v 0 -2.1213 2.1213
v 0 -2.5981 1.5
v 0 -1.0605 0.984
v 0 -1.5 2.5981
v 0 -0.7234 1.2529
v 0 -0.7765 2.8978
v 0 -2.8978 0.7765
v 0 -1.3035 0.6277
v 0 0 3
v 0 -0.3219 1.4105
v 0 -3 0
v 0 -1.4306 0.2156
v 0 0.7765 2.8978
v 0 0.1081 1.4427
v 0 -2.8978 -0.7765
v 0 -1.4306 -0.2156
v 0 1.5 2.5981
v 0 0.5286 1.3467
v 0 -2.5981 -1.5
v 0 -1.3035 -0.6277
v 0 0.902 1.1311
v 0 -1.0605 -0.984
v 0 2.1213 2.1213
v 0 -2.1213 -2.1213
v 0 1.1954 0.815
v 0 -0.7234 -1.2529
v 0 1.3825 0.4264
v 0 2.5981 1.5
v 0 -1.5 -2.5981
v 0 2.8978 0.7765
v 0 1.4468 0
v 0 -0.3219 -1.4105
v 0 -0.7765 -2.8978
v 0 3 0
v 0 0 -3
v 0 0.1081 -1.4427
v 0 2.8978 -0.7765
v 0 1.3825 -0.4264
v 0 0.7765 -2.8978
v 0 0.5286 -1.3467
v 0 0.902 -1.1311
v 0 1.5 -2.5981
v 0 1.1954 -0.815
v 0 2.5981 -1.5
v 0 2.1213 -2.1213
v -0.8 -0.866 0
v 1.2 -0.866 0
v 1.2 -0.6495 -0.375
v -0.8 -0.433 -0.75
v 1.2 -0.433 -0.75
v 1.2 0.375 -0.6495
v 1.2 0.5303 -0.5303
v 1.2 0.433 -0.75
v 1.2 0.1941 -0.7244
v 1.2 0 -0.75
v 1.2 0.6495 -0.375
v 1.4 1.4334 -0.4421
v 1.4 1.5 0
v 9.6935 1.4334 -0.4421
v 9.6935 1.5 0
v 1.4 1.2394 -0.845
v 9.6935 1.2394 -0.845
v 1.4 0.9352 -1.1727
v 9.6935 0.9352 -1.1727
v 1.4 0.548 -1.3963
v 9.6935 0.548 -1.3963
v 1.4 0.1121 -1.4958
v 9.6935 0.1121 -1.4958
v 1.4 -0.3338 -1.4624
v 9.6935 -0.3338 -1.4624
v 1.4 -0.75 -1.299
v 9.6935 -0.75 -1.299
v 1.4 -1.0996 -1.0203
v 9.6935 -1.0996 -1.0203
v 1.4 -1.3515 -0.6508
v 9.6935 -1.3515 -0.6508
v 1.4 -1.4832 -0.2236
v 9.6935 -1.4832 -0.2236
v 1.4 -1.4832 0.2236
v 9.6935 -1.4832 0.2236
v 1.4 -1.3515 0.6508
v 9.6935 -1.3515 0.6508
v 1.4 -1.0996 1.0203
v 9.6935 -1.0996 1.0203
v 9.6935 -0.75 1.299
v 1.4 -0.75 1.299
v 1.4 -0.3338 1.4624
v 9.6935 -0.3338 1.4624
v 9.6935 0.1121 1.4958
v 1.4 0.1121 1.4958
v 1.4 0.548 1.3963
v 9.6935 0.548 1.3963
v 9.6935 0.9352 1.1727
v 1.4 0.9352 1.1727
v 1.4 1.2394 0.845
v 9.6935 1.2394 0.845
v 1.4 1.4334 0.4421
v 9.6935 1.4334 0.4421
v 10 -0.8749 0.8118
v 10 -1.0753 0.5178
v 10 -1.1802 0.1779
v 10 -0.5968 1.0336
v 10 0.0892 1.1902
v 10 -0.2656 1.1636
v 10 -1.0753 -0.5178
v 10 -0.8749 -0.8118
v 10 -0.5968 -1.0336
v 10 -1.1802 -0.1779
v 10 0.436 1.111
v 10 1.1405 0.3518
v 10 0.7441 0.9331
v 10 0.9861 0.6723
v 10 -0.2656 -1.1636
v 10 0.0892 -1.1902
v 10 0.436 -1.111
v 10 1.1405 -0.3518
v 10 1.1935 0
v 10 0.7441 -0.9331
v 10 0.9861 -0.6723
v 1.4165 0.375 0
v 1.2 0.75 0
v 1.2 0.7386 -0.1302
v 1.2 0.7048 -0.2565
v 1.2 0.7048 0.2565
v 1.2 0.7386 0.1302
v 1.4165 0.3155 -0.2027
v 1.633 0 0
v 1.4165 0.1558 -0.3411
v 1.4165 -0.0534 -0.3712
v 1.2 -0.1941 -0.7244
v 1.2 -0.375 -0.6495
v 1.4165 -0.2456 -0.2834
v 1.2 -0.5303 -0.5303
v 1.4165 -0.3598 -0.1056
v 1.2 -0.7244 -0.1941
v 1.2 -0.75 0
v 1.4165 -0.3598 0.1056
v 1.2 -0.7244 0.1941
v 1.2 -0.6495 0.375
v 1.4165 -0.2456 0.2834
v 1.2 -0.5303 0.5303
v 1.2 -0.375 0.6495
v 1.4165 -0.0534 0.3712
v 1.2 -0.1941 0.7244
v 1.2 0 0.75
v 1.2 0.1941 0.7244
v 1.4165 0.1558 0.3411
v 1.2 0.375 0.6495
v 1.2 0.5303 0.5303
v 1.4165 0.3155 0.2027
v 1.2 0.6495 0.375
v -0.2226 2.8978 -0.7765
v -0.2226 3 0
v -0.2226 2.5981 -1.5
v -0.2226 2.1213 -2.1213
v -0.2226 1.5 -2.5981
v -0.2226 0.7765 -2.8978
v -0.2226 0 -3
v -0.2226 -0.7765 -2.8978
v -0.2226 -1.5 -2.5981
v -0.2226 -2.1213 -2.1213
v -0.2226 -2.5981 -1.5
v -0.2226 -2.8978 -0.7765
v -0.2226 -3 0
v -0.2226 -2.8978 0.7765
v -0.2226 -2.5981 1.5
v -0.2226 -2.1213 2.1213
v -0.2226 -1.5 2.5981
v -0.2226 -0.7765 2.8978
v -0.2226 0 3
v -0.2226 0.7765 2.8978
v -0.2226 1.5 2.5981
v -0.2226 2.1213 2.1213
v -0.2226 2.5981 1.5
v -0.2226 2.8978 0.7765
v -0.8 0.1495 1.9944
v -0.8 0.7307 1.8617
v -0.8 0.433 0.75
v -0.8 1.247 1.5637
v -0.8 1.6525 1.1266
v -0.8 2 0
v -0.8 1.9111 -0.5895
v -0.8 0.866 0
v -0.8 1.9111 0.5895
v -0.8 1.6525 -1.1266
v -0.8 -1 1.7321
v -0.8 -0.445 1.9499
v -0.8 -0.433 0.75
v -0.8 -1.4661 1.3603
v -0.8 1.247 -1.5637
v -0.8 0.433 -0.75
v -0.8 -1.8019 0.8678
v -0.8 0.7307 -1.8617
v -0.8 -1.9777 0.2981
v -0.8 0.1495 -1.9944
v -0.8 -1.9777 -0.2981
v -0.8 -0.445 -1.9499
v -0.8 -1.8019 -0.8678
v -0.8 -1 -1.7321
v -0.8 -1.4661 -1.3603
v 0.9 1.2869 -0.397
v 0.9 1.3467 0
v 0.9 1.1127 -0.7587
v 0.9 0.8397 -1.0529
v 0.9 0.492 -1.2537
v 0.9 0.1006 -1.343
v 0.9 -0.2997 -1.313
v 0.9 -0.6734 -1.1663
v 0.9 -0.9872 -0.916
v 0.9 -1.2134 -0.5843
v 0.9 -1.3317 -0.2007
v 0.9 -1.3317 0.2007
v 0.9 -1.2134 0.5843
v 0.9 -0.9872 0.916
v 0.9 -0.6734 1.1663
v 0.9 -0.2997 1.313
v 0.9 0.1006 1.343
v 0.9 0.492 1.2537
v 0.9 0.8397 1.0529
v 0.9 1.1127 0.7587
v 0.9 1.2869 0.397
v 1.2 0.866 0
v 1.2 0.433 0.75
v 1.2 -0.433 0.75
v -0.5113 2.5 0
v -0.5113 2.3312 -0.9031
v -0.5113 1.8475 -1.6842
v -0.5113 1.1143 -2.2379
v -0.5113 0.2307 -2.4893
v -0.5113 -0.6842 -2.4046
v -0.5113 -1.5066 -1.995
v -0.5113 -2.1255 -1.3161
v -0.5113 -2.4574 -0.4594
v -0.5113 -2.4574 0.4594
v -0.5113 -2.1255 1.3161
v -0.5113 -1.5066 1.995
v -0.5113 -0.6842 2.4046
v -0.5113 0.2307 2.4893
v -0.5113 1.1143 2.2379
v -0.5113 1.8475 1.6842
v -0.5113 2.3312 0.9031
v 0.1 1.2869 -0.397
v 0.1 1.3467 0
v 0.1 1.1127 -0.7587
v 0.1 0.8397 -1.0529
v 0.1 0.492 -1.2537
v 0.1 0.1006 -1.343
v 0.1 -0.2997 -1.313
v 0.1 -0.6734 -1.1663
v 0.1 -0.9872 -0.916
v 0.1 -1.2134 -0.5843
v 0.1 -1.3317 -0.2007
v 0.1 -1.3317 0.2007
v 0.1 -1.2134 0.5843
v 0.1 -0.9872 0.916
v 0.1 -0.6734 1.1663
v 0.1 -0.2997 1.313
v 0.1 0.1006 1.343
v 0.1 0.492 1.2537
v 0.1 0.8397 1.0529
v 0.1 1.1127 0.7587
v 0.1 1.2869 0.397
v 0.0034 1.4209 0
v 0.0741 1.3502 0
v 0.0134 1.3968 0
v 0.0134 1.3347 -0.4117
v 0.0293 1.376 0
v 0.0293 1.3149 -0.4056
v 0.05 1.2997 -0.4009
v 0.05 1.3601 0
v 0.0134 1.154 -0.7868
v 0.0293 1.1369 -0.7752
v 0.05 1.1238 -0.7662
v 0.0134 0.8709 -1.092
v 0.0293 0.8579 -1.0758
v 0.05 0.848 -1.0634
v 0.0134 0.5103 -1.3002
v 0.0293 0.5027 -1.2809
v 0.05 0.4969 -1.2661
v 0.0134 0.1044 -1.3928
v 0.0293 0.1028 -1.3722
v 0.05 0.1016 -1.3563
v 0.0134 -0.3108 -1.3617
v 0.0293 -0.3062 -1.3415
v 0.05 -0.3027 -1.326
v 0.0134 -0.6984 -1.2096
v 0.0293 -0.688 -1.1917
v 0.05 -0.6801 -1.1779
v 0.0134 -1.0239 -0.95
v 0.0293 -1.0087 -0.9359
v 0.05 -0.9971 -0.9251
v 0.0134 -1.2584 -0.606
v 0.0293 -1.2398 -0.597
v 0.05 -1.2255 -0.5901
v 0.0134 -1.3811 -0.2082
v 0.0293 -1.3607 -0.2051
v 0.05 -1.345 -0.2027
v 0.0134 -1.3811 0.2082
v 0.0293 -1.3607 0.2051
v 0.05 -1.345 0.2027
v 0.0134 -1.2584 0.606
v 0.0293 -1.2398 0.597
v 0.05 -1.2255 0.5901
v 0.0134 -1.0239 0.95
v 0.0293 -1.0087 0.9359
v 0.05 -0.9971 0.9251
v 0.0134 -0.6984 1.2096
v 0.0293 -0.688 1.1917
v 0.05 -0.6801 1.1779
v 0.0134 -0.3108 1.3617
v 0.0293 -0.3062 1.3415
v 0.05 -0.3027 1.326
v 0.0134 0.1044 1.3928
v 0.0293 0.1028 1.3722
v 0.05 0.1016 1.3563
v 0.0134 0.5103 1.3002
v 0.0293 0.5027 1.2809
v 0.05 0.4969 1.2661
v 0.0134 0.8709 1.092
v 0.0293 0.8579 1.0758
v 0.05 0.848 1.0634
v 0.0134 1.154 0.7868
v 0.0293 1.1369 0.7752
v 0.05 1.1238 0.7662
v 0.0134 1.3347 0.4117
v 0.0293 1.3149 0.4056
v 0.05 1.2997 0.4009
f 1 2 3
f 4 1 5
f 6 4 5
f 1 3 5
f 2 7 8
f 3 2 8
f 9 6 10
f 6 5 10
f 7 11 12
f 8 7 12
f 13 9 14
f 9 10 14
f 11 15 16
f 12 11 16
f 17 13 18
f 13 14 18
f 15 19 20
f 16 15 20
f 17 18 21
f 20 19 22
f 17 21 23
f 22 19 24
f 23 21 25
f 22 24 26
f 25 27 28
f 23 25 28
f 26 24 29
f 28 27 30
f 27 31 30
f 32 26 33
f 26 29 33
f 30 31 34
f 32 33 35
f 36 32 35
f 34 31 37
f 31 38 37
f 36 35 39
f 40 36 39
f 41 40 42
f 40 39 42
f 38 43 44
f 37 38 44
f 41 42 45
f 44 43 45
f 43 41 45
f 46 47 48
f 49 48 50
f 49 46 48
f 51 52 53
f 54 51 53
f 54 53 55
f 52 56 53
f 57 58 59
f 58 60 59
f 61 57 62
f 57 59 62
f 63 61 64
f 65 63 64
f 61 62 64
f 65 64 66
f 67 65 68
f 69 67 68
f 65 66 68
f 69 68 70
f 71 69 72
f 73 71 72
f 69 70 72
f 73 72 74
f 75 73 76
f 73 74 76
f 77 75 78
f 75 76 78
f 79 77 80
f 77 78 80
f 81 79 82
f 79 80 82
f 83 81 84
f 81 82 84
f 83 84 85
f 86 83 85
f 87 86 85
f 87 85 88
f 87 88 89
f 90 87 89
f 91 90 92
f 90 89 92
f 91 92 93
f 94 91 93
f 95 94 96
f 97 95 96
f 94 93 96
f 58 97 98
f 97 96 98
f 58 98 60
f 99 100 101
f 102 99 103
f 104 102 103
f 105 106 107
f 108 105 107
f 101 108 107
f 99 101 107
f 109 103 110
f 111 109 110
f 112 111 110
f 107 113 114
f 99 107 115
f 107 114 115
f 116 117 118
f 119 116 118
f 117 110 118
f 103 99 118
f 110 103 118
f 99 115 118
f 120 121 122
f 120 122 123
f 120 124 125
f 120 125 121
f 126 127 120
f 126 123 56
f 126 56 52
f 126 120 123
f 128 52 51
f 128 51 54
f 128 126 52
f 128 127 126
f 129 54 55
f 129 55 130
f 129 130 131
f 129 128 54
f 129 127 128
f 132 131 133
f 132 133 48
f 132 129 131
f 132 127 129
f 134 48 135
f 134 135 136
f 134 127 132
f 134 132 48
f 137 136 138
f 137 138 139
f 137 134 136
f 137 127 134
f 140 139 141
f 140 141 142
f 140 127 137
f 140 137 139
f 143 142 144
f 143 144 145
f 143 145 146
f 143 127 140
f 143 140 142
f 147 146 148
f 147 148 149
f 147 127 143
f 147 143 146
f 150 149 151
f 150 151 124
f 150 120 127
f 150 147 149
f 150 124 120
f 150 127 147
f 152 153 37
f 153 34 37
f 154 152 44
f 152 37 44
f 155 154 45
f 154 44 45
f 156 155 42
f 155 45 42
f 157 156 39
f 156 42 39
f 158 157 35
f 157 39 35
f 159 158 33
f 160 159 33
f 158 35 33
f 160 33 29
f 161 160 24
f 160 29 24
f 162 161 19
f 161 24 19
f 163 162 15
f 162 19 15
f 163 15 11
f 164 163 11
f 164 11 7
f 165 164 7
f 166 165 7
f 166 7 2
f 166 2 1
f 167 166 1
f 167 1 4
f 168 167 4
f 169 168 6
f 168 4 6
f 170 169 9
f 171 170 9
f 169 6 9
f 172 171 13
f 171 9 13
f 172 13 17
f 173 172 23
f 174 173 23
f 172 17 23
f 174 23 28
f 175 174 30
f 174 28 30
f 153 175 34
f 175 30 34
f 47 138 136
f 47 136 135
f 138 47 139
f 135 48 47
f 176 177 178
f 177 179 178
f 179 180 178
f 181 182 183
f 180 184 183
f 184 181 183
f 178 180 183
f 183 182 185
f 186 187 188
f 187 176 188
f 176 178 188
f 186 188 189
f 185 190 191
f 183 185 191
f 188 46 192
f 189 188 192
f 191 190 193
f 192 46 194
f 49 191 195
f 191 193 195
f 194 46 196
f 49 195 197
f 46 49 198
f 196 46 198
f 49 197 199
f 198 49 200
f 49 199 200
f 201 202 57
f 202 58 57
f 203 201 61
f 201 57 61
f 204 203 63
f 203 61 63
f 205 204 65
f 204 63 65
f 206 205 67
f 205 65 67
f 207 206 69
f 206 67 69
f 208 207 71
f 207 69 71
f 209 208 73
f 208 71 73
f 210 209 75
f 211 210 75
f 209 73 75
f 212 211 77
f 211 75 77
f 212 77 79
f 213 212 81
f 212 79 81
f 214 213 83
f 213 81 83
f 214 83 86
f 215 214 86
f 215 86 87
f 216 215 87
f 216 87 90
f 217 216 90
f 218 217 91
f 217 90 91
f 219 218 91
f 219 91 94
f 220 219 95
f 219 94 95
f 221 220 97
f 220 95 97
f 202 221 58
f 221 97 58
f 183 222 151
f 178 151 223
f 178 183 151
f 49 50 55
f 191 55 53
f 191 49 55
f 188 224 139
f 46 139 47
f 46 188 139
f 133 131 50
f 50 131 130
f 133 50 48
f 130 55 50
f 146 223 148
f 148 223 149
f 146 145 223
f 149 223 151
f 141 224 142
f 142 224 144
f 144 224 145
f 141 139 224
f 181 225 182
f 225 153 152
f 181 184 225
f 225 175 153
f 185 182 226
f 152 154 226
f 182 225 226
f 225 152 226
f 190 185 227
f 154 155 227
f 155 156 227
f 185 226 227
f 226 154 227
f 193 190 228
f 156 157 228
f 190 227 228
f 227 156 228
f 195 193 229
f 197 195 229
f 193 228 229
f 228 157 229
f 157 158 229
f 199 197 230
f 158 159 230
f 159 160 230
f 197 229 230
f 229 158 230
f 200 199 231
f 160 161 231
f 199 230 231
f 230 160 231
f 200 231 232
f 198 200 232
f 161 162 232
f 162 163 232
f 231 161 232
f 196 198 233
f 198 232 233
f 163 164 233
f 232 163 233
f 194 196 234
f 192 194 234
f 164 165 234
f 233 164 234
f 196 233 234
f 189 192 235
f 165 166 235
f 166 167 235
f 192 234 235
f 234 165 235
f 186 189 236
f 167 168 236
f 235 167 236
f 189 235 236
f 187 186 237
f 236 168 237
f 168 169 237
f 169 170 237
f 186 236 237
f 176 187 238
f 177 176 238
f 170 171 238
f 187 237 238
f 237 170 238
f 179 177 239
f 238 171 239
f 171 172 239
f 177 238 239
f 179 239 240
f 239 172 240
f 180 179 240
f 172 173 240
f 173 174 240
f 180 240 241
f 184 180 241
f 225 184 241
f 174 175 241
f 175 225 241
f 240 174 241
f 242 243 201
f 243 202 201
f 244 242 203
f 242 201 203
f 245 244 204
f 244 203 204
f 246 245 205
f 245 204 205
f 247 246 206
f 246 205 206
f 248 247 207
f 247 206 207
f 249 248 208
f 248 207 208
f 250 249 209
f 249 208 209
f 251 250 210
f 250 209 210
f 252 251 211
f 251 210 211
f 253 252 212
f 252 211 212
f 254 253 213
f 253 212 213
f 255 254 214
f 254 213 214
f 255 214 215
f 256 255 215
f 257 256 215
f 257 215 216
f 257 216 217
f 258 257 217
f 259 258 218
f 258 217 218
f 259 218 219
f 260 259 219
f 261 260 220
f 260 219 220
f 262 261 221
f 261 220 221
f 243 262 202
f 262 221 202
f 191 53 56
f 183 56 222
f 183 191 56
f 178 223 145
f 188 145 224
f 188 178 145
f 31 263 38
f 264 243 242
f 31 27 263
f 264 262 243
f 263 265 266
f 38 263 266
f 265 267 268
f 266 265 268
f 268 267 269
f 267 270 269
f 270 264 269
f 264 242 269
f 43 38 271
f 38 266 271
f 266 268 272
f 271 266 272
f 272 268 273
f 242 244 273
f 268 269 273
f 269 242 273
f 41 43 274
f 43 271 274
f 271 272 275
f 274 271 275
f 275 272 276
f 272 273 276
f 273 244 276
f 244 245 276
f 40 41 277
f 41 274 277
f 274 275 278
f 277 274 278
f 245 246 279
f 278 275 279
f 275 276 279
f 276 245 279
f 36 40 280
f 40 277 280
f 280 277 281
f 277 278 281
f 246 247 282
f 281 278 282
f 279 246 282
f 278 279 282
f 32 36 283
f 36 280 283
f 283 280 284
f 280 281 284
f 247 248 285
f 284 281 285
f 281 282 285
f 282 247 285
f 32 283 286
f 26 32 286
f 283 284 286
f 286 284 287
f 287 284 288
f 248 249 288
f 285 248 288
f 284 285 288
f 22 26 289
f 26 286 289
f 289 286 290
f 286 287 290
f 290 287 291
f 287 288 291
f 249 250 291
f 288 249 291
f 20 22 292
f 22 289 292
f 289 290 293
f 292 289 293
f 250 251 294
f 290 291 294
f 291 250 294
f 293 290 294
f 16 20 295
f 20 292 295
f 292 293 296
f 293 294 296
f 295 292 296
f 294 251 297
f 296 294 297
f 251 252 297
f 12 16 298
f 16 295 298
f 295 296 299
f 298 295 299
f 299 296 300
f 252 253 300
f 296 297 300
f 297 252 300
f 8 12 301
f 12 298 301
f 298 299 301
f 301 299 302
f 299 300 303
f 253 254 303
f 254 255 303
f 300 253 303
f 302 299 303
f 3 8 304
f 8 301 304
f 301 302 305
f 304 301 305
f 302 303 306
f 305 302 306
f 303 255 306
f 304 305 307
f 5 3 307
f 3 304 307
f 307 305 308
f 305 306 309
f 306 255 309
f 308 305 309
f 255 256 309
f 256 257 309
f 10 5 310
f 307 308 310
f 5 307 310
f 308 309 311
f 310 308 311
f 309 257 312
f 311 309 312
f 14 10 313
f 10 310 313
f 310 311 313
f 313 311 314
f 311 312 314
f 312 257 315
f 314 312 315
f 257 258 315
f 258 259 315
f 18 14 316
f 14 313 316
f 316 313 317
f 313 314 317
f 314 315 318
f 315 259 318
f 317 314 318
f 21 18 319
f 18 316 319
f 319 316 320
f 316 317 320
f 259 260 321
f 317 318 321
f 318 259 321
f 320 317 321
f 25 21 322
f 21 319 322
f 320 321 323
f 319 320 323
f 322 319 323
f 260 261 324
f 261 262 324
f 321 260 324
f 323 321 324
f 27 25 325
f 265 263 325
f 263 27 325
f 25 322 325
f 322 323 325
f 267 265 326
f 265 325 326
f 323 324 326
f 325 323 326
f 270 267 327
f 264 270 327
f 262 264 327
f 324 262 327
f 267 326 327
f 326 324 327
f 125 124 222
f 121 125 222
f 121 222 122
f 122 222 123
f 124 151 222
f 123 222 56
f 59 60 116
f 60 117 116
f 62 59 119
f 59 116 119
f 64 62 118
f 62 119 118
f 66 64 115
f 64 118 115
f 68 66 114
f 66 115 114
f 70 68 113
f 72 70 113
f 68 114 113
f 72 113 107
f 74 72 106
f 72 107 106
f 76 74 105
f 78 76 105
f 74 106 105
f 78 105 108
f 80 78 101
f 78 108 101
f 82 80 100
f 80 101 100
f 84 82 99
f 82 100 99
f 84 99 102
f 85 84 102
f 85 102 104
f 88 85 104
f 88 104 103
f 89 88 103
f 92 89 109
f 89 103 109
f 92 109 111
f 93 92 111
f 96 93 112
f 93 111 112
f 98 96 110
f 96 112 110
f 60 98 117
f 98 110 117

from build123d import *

# Parameters (mm, degrees)
CUT_EXTRUDE1_DEPTH = 2


with BuildPart() as part:
    # Sketch1 → Revolve1 (revolve)
    with BuildSketch(Plane.XY):
        with BuildLine():
            Line((-0.8, 0), (-0.8, 2))
            Line((-0.8, 2), (-0.222649731, 3))
            Line((-0.222649731, 3), (0, 3))
            Line((0, 3), (0, 1.44675))
            ThreePointArc((0, 1.44675), (0.029289322, 1.376039322), (0.1, 1.34675))
            Line((0.1, 1.34675), (0.9, 1.34675))
            Line((0.9, 1.34675), (1.4, 1.5))
            Line((1.4, 1.5), (9.6935, 1.5))
            Line((9.6935, 1.5), (10, 1.1935))
            Line((10, 1.1935), (10, 0))
            Line((10, 0), (-0.8, 0))
        make_face()
    revolve(axis=Axis((10, 0, 0), (-1, 0, 0)))

    # Sketch2 → Cut-Revolve1 (revolve, cut)
    with BuildSketch(Plane.XY):
        Polygon((-0.8, 0), (-0.8, 0.75), (1.2, 0.75), (1.633012702, 0), align=None)
    revolve(axis=Axis((1.633012702, 0, 0), (-1, 0, 0)), mode=Mode.SUBTRACT)

    # Sketch3 → Cut-Extrude1 (cut)
    with BuildSketch(Plane(origin=(-0.8, 0, 0), x_dir=(0, 0, -1), z_dir=(1, 0, 0))):
        Polygon((-0.75, -0.433012702), (0, -0.866025404), (0.75, -0.433012702), (0.75, 0.433012702), (0, 0.866025404), (-0.75, 0.433012702), align=None)
    extrude(amount=CUT_EXTRUDE1_DEPTH, mode=Mode.SUBTRACT)


solid = part.part
